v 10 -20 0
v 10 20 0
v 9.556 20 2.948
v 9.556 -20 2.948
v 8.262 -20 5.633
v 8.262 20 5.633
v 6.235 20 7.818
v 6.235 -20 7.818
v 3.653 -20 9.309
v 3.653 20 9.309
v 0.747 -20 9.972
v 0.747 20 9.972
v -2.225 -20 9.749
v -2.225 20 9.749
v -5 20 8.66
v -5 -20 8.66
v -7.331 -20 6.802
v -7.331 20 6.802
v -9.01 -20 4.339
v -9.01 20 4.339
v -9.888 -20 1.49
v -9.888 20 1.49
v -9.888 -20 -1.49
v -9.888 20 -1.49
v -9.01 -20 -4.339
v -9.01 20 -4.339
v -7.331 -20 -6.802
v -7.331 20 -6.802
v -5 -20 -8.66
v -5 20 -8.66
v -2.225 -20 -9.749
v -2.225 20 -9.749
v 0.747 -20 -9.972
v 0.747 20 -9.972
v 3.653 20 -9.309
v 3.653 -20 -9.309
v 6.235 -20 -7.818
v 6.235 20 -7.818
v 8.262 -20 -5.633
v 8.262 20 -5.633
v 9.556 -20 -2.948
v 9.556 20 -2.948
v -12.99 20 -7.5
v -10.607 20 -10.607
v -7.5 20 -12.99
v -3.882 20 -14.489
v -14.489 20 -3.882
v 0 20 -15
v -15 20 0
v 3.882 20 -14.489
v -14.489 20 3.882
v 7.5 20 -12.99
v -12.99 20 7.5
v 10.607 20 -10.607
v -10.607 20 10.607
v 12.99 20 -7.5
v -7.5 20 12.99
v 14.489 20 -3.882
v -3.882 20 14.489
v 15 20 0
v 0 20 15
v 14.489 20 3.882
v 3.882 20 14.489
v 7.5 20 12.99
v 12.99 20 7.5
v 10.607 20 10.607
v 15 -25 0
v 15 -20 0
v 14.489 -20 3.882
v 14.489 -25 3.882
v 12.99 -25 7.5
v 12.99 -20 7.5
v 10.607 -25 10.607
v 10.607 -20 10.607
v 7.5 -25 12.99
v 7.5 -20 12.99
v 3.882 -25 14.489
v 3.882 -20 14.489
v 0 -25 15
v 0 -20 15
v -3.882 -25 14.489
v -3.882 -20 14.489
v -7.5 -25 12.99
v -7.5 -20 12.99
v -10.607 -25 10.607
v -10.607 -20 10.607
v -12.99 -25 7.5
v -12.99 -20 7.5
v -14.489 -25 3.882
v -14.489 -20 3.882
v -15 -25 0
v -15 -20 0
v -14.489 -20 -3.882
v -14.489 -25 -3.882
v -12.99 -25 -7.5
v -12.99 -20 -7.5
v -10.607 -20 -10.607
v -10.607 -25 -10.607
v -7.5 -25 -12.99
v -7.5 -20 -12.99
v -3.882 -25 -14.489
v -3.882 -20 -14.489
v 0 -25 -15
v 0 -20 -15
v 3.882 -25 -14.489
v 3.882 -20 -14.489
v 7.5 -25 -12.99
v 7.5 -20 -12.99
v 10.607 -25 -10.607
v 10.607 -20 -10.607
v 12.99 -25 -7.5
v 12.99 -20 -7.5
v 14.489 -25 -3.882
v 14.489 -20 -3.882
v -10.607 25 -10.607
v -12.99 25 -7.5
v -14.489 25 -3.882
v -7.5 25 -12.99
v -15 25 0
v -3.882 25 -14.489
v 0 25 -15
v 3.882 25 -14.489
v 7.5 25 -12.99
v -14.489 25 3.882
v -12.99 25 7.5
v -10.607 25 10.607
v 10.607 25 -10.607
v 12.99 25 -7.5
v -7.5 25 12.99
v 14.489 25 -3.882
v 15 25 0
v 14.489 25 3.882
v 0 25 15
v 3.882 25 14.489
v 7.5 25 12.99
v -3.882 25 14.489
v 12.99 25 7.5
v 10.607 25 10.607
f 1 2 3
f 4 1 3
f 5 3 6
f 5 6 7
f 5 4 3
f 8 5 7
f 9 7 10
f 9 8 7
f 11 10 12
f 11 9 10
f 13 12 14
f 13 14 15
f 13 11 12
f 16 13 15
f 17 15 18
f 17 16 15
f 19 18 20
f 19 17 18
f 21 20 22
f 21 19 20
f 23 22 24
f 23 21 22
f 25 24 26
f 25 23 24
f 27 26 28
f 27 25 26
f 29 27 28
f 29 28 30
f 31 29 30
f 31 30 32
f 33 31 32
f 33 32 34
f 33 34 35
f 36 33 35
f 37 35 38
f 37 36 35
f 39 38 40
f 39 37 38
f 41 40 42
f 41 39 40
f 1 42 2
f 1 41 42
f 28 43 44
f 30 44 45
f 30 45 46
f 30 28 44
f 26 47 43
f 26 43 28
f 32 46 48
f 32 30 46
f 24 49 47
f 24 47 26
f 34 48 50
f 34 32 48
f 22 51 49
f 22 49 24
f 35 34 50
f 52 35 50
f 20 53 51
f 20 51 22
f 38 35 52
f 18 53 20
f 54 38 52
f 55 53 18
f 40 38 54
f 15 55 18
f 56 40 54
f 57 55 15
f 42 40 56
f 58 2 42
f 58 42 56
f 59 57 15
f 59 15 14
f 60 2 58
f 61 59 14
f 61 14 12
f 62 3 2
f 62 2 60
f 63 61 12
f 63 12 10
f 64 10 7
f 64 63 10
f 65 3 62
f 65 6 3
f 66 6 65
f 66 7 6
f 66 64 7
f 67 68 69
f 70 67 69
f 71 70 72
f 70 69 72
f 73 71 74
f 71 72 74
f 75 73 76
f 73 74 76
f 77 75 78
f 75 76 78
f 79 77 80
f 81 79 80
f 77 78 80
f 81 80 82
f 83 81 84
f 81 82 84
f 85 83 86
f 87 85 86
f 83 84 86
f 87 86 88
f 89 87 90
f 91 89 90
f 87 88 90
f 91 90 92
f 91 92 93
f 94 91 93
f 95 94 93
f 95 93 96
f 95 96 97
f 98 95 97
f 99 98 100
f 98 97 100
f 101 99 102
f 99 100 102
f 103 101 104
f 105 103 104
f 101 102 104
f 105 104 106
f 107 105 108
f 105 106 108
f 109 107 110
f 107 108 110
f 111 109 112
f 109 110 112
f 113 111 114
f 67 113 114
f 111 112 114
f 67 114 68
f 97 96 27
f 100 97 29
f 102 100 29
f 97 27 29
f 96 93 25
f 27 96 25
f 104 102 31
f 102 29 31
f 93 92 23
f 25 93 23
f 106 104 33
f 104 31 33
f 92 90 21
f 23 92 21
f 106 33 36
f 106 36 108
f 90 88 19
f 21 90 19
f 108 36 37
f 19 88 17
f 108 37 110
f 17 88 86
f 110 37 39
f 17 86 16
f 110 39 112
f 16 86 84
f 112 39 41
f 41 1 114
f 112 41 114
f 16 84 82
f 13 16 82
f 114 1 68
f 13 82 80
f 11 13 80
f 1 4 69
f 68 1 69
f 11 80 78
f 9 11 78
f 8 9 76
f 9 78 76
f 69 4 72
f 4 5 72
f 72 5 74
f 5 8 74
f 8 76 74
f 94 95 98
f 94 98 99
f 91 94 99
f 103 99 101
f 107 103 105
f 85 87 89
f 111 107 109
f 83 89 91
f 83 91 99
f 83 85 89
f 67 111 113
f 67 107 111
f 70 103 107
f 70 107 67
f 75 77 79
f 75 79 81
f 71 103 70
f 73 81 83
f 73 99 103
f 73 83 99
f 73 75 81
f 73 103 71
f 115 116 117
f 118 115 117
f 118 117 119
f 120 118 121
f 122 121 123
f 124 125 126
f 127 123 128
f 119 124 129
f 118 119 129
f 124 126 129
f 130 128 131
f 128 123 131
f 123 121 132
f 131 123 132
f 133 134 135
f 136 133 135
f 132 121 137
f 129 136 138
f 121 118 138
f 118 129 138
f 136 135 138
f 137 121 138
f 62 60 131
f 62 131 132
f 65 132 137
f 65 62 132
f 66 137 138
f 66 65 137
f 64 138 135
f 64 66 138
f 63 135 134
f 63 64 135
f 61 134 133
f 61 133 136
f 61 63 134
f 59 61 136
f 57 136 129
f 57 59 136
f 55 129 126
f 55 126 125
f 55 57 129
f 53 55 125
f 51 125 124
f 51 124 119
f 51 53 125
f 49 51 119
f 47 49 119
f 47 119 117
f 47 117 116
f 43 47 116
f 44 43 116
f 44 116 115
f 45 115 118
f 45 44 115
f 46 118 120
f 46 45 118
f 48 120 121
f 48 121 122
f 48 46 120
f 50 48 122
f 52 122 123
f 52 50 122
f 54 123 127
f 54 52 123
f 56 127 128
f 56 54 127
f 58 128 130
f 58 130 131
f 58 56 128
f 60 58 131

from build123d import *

# Parameters (mm, degrees)
F0_R     = 10
F1_DEPTH = 20
F2_R     = 15
F3_DEPTH = 5


with BuildPart() as f1:
    # F0 (on Front) → F1 (new body)
    with BuildSketch(Plane.XZ):
        Circle(F0_R)
    extrude(amount=F1_DEPTH)

    # F2 (on face) → F3 (join)
    with BuildSketch(Plane.XZ.offset(20)):
        Circle(F2_R)
    extrude(amount=F3_DEPTH)

    # F4: F1 across face


with BuildPart() as f1_1:
    add(f1.part)
    add(f1.part.mirror(Plane(origin=(0, 0, 0), x_dir=(1, 0, 0), z_dir=(0, 1, 0))))


solid = f1_1.part
